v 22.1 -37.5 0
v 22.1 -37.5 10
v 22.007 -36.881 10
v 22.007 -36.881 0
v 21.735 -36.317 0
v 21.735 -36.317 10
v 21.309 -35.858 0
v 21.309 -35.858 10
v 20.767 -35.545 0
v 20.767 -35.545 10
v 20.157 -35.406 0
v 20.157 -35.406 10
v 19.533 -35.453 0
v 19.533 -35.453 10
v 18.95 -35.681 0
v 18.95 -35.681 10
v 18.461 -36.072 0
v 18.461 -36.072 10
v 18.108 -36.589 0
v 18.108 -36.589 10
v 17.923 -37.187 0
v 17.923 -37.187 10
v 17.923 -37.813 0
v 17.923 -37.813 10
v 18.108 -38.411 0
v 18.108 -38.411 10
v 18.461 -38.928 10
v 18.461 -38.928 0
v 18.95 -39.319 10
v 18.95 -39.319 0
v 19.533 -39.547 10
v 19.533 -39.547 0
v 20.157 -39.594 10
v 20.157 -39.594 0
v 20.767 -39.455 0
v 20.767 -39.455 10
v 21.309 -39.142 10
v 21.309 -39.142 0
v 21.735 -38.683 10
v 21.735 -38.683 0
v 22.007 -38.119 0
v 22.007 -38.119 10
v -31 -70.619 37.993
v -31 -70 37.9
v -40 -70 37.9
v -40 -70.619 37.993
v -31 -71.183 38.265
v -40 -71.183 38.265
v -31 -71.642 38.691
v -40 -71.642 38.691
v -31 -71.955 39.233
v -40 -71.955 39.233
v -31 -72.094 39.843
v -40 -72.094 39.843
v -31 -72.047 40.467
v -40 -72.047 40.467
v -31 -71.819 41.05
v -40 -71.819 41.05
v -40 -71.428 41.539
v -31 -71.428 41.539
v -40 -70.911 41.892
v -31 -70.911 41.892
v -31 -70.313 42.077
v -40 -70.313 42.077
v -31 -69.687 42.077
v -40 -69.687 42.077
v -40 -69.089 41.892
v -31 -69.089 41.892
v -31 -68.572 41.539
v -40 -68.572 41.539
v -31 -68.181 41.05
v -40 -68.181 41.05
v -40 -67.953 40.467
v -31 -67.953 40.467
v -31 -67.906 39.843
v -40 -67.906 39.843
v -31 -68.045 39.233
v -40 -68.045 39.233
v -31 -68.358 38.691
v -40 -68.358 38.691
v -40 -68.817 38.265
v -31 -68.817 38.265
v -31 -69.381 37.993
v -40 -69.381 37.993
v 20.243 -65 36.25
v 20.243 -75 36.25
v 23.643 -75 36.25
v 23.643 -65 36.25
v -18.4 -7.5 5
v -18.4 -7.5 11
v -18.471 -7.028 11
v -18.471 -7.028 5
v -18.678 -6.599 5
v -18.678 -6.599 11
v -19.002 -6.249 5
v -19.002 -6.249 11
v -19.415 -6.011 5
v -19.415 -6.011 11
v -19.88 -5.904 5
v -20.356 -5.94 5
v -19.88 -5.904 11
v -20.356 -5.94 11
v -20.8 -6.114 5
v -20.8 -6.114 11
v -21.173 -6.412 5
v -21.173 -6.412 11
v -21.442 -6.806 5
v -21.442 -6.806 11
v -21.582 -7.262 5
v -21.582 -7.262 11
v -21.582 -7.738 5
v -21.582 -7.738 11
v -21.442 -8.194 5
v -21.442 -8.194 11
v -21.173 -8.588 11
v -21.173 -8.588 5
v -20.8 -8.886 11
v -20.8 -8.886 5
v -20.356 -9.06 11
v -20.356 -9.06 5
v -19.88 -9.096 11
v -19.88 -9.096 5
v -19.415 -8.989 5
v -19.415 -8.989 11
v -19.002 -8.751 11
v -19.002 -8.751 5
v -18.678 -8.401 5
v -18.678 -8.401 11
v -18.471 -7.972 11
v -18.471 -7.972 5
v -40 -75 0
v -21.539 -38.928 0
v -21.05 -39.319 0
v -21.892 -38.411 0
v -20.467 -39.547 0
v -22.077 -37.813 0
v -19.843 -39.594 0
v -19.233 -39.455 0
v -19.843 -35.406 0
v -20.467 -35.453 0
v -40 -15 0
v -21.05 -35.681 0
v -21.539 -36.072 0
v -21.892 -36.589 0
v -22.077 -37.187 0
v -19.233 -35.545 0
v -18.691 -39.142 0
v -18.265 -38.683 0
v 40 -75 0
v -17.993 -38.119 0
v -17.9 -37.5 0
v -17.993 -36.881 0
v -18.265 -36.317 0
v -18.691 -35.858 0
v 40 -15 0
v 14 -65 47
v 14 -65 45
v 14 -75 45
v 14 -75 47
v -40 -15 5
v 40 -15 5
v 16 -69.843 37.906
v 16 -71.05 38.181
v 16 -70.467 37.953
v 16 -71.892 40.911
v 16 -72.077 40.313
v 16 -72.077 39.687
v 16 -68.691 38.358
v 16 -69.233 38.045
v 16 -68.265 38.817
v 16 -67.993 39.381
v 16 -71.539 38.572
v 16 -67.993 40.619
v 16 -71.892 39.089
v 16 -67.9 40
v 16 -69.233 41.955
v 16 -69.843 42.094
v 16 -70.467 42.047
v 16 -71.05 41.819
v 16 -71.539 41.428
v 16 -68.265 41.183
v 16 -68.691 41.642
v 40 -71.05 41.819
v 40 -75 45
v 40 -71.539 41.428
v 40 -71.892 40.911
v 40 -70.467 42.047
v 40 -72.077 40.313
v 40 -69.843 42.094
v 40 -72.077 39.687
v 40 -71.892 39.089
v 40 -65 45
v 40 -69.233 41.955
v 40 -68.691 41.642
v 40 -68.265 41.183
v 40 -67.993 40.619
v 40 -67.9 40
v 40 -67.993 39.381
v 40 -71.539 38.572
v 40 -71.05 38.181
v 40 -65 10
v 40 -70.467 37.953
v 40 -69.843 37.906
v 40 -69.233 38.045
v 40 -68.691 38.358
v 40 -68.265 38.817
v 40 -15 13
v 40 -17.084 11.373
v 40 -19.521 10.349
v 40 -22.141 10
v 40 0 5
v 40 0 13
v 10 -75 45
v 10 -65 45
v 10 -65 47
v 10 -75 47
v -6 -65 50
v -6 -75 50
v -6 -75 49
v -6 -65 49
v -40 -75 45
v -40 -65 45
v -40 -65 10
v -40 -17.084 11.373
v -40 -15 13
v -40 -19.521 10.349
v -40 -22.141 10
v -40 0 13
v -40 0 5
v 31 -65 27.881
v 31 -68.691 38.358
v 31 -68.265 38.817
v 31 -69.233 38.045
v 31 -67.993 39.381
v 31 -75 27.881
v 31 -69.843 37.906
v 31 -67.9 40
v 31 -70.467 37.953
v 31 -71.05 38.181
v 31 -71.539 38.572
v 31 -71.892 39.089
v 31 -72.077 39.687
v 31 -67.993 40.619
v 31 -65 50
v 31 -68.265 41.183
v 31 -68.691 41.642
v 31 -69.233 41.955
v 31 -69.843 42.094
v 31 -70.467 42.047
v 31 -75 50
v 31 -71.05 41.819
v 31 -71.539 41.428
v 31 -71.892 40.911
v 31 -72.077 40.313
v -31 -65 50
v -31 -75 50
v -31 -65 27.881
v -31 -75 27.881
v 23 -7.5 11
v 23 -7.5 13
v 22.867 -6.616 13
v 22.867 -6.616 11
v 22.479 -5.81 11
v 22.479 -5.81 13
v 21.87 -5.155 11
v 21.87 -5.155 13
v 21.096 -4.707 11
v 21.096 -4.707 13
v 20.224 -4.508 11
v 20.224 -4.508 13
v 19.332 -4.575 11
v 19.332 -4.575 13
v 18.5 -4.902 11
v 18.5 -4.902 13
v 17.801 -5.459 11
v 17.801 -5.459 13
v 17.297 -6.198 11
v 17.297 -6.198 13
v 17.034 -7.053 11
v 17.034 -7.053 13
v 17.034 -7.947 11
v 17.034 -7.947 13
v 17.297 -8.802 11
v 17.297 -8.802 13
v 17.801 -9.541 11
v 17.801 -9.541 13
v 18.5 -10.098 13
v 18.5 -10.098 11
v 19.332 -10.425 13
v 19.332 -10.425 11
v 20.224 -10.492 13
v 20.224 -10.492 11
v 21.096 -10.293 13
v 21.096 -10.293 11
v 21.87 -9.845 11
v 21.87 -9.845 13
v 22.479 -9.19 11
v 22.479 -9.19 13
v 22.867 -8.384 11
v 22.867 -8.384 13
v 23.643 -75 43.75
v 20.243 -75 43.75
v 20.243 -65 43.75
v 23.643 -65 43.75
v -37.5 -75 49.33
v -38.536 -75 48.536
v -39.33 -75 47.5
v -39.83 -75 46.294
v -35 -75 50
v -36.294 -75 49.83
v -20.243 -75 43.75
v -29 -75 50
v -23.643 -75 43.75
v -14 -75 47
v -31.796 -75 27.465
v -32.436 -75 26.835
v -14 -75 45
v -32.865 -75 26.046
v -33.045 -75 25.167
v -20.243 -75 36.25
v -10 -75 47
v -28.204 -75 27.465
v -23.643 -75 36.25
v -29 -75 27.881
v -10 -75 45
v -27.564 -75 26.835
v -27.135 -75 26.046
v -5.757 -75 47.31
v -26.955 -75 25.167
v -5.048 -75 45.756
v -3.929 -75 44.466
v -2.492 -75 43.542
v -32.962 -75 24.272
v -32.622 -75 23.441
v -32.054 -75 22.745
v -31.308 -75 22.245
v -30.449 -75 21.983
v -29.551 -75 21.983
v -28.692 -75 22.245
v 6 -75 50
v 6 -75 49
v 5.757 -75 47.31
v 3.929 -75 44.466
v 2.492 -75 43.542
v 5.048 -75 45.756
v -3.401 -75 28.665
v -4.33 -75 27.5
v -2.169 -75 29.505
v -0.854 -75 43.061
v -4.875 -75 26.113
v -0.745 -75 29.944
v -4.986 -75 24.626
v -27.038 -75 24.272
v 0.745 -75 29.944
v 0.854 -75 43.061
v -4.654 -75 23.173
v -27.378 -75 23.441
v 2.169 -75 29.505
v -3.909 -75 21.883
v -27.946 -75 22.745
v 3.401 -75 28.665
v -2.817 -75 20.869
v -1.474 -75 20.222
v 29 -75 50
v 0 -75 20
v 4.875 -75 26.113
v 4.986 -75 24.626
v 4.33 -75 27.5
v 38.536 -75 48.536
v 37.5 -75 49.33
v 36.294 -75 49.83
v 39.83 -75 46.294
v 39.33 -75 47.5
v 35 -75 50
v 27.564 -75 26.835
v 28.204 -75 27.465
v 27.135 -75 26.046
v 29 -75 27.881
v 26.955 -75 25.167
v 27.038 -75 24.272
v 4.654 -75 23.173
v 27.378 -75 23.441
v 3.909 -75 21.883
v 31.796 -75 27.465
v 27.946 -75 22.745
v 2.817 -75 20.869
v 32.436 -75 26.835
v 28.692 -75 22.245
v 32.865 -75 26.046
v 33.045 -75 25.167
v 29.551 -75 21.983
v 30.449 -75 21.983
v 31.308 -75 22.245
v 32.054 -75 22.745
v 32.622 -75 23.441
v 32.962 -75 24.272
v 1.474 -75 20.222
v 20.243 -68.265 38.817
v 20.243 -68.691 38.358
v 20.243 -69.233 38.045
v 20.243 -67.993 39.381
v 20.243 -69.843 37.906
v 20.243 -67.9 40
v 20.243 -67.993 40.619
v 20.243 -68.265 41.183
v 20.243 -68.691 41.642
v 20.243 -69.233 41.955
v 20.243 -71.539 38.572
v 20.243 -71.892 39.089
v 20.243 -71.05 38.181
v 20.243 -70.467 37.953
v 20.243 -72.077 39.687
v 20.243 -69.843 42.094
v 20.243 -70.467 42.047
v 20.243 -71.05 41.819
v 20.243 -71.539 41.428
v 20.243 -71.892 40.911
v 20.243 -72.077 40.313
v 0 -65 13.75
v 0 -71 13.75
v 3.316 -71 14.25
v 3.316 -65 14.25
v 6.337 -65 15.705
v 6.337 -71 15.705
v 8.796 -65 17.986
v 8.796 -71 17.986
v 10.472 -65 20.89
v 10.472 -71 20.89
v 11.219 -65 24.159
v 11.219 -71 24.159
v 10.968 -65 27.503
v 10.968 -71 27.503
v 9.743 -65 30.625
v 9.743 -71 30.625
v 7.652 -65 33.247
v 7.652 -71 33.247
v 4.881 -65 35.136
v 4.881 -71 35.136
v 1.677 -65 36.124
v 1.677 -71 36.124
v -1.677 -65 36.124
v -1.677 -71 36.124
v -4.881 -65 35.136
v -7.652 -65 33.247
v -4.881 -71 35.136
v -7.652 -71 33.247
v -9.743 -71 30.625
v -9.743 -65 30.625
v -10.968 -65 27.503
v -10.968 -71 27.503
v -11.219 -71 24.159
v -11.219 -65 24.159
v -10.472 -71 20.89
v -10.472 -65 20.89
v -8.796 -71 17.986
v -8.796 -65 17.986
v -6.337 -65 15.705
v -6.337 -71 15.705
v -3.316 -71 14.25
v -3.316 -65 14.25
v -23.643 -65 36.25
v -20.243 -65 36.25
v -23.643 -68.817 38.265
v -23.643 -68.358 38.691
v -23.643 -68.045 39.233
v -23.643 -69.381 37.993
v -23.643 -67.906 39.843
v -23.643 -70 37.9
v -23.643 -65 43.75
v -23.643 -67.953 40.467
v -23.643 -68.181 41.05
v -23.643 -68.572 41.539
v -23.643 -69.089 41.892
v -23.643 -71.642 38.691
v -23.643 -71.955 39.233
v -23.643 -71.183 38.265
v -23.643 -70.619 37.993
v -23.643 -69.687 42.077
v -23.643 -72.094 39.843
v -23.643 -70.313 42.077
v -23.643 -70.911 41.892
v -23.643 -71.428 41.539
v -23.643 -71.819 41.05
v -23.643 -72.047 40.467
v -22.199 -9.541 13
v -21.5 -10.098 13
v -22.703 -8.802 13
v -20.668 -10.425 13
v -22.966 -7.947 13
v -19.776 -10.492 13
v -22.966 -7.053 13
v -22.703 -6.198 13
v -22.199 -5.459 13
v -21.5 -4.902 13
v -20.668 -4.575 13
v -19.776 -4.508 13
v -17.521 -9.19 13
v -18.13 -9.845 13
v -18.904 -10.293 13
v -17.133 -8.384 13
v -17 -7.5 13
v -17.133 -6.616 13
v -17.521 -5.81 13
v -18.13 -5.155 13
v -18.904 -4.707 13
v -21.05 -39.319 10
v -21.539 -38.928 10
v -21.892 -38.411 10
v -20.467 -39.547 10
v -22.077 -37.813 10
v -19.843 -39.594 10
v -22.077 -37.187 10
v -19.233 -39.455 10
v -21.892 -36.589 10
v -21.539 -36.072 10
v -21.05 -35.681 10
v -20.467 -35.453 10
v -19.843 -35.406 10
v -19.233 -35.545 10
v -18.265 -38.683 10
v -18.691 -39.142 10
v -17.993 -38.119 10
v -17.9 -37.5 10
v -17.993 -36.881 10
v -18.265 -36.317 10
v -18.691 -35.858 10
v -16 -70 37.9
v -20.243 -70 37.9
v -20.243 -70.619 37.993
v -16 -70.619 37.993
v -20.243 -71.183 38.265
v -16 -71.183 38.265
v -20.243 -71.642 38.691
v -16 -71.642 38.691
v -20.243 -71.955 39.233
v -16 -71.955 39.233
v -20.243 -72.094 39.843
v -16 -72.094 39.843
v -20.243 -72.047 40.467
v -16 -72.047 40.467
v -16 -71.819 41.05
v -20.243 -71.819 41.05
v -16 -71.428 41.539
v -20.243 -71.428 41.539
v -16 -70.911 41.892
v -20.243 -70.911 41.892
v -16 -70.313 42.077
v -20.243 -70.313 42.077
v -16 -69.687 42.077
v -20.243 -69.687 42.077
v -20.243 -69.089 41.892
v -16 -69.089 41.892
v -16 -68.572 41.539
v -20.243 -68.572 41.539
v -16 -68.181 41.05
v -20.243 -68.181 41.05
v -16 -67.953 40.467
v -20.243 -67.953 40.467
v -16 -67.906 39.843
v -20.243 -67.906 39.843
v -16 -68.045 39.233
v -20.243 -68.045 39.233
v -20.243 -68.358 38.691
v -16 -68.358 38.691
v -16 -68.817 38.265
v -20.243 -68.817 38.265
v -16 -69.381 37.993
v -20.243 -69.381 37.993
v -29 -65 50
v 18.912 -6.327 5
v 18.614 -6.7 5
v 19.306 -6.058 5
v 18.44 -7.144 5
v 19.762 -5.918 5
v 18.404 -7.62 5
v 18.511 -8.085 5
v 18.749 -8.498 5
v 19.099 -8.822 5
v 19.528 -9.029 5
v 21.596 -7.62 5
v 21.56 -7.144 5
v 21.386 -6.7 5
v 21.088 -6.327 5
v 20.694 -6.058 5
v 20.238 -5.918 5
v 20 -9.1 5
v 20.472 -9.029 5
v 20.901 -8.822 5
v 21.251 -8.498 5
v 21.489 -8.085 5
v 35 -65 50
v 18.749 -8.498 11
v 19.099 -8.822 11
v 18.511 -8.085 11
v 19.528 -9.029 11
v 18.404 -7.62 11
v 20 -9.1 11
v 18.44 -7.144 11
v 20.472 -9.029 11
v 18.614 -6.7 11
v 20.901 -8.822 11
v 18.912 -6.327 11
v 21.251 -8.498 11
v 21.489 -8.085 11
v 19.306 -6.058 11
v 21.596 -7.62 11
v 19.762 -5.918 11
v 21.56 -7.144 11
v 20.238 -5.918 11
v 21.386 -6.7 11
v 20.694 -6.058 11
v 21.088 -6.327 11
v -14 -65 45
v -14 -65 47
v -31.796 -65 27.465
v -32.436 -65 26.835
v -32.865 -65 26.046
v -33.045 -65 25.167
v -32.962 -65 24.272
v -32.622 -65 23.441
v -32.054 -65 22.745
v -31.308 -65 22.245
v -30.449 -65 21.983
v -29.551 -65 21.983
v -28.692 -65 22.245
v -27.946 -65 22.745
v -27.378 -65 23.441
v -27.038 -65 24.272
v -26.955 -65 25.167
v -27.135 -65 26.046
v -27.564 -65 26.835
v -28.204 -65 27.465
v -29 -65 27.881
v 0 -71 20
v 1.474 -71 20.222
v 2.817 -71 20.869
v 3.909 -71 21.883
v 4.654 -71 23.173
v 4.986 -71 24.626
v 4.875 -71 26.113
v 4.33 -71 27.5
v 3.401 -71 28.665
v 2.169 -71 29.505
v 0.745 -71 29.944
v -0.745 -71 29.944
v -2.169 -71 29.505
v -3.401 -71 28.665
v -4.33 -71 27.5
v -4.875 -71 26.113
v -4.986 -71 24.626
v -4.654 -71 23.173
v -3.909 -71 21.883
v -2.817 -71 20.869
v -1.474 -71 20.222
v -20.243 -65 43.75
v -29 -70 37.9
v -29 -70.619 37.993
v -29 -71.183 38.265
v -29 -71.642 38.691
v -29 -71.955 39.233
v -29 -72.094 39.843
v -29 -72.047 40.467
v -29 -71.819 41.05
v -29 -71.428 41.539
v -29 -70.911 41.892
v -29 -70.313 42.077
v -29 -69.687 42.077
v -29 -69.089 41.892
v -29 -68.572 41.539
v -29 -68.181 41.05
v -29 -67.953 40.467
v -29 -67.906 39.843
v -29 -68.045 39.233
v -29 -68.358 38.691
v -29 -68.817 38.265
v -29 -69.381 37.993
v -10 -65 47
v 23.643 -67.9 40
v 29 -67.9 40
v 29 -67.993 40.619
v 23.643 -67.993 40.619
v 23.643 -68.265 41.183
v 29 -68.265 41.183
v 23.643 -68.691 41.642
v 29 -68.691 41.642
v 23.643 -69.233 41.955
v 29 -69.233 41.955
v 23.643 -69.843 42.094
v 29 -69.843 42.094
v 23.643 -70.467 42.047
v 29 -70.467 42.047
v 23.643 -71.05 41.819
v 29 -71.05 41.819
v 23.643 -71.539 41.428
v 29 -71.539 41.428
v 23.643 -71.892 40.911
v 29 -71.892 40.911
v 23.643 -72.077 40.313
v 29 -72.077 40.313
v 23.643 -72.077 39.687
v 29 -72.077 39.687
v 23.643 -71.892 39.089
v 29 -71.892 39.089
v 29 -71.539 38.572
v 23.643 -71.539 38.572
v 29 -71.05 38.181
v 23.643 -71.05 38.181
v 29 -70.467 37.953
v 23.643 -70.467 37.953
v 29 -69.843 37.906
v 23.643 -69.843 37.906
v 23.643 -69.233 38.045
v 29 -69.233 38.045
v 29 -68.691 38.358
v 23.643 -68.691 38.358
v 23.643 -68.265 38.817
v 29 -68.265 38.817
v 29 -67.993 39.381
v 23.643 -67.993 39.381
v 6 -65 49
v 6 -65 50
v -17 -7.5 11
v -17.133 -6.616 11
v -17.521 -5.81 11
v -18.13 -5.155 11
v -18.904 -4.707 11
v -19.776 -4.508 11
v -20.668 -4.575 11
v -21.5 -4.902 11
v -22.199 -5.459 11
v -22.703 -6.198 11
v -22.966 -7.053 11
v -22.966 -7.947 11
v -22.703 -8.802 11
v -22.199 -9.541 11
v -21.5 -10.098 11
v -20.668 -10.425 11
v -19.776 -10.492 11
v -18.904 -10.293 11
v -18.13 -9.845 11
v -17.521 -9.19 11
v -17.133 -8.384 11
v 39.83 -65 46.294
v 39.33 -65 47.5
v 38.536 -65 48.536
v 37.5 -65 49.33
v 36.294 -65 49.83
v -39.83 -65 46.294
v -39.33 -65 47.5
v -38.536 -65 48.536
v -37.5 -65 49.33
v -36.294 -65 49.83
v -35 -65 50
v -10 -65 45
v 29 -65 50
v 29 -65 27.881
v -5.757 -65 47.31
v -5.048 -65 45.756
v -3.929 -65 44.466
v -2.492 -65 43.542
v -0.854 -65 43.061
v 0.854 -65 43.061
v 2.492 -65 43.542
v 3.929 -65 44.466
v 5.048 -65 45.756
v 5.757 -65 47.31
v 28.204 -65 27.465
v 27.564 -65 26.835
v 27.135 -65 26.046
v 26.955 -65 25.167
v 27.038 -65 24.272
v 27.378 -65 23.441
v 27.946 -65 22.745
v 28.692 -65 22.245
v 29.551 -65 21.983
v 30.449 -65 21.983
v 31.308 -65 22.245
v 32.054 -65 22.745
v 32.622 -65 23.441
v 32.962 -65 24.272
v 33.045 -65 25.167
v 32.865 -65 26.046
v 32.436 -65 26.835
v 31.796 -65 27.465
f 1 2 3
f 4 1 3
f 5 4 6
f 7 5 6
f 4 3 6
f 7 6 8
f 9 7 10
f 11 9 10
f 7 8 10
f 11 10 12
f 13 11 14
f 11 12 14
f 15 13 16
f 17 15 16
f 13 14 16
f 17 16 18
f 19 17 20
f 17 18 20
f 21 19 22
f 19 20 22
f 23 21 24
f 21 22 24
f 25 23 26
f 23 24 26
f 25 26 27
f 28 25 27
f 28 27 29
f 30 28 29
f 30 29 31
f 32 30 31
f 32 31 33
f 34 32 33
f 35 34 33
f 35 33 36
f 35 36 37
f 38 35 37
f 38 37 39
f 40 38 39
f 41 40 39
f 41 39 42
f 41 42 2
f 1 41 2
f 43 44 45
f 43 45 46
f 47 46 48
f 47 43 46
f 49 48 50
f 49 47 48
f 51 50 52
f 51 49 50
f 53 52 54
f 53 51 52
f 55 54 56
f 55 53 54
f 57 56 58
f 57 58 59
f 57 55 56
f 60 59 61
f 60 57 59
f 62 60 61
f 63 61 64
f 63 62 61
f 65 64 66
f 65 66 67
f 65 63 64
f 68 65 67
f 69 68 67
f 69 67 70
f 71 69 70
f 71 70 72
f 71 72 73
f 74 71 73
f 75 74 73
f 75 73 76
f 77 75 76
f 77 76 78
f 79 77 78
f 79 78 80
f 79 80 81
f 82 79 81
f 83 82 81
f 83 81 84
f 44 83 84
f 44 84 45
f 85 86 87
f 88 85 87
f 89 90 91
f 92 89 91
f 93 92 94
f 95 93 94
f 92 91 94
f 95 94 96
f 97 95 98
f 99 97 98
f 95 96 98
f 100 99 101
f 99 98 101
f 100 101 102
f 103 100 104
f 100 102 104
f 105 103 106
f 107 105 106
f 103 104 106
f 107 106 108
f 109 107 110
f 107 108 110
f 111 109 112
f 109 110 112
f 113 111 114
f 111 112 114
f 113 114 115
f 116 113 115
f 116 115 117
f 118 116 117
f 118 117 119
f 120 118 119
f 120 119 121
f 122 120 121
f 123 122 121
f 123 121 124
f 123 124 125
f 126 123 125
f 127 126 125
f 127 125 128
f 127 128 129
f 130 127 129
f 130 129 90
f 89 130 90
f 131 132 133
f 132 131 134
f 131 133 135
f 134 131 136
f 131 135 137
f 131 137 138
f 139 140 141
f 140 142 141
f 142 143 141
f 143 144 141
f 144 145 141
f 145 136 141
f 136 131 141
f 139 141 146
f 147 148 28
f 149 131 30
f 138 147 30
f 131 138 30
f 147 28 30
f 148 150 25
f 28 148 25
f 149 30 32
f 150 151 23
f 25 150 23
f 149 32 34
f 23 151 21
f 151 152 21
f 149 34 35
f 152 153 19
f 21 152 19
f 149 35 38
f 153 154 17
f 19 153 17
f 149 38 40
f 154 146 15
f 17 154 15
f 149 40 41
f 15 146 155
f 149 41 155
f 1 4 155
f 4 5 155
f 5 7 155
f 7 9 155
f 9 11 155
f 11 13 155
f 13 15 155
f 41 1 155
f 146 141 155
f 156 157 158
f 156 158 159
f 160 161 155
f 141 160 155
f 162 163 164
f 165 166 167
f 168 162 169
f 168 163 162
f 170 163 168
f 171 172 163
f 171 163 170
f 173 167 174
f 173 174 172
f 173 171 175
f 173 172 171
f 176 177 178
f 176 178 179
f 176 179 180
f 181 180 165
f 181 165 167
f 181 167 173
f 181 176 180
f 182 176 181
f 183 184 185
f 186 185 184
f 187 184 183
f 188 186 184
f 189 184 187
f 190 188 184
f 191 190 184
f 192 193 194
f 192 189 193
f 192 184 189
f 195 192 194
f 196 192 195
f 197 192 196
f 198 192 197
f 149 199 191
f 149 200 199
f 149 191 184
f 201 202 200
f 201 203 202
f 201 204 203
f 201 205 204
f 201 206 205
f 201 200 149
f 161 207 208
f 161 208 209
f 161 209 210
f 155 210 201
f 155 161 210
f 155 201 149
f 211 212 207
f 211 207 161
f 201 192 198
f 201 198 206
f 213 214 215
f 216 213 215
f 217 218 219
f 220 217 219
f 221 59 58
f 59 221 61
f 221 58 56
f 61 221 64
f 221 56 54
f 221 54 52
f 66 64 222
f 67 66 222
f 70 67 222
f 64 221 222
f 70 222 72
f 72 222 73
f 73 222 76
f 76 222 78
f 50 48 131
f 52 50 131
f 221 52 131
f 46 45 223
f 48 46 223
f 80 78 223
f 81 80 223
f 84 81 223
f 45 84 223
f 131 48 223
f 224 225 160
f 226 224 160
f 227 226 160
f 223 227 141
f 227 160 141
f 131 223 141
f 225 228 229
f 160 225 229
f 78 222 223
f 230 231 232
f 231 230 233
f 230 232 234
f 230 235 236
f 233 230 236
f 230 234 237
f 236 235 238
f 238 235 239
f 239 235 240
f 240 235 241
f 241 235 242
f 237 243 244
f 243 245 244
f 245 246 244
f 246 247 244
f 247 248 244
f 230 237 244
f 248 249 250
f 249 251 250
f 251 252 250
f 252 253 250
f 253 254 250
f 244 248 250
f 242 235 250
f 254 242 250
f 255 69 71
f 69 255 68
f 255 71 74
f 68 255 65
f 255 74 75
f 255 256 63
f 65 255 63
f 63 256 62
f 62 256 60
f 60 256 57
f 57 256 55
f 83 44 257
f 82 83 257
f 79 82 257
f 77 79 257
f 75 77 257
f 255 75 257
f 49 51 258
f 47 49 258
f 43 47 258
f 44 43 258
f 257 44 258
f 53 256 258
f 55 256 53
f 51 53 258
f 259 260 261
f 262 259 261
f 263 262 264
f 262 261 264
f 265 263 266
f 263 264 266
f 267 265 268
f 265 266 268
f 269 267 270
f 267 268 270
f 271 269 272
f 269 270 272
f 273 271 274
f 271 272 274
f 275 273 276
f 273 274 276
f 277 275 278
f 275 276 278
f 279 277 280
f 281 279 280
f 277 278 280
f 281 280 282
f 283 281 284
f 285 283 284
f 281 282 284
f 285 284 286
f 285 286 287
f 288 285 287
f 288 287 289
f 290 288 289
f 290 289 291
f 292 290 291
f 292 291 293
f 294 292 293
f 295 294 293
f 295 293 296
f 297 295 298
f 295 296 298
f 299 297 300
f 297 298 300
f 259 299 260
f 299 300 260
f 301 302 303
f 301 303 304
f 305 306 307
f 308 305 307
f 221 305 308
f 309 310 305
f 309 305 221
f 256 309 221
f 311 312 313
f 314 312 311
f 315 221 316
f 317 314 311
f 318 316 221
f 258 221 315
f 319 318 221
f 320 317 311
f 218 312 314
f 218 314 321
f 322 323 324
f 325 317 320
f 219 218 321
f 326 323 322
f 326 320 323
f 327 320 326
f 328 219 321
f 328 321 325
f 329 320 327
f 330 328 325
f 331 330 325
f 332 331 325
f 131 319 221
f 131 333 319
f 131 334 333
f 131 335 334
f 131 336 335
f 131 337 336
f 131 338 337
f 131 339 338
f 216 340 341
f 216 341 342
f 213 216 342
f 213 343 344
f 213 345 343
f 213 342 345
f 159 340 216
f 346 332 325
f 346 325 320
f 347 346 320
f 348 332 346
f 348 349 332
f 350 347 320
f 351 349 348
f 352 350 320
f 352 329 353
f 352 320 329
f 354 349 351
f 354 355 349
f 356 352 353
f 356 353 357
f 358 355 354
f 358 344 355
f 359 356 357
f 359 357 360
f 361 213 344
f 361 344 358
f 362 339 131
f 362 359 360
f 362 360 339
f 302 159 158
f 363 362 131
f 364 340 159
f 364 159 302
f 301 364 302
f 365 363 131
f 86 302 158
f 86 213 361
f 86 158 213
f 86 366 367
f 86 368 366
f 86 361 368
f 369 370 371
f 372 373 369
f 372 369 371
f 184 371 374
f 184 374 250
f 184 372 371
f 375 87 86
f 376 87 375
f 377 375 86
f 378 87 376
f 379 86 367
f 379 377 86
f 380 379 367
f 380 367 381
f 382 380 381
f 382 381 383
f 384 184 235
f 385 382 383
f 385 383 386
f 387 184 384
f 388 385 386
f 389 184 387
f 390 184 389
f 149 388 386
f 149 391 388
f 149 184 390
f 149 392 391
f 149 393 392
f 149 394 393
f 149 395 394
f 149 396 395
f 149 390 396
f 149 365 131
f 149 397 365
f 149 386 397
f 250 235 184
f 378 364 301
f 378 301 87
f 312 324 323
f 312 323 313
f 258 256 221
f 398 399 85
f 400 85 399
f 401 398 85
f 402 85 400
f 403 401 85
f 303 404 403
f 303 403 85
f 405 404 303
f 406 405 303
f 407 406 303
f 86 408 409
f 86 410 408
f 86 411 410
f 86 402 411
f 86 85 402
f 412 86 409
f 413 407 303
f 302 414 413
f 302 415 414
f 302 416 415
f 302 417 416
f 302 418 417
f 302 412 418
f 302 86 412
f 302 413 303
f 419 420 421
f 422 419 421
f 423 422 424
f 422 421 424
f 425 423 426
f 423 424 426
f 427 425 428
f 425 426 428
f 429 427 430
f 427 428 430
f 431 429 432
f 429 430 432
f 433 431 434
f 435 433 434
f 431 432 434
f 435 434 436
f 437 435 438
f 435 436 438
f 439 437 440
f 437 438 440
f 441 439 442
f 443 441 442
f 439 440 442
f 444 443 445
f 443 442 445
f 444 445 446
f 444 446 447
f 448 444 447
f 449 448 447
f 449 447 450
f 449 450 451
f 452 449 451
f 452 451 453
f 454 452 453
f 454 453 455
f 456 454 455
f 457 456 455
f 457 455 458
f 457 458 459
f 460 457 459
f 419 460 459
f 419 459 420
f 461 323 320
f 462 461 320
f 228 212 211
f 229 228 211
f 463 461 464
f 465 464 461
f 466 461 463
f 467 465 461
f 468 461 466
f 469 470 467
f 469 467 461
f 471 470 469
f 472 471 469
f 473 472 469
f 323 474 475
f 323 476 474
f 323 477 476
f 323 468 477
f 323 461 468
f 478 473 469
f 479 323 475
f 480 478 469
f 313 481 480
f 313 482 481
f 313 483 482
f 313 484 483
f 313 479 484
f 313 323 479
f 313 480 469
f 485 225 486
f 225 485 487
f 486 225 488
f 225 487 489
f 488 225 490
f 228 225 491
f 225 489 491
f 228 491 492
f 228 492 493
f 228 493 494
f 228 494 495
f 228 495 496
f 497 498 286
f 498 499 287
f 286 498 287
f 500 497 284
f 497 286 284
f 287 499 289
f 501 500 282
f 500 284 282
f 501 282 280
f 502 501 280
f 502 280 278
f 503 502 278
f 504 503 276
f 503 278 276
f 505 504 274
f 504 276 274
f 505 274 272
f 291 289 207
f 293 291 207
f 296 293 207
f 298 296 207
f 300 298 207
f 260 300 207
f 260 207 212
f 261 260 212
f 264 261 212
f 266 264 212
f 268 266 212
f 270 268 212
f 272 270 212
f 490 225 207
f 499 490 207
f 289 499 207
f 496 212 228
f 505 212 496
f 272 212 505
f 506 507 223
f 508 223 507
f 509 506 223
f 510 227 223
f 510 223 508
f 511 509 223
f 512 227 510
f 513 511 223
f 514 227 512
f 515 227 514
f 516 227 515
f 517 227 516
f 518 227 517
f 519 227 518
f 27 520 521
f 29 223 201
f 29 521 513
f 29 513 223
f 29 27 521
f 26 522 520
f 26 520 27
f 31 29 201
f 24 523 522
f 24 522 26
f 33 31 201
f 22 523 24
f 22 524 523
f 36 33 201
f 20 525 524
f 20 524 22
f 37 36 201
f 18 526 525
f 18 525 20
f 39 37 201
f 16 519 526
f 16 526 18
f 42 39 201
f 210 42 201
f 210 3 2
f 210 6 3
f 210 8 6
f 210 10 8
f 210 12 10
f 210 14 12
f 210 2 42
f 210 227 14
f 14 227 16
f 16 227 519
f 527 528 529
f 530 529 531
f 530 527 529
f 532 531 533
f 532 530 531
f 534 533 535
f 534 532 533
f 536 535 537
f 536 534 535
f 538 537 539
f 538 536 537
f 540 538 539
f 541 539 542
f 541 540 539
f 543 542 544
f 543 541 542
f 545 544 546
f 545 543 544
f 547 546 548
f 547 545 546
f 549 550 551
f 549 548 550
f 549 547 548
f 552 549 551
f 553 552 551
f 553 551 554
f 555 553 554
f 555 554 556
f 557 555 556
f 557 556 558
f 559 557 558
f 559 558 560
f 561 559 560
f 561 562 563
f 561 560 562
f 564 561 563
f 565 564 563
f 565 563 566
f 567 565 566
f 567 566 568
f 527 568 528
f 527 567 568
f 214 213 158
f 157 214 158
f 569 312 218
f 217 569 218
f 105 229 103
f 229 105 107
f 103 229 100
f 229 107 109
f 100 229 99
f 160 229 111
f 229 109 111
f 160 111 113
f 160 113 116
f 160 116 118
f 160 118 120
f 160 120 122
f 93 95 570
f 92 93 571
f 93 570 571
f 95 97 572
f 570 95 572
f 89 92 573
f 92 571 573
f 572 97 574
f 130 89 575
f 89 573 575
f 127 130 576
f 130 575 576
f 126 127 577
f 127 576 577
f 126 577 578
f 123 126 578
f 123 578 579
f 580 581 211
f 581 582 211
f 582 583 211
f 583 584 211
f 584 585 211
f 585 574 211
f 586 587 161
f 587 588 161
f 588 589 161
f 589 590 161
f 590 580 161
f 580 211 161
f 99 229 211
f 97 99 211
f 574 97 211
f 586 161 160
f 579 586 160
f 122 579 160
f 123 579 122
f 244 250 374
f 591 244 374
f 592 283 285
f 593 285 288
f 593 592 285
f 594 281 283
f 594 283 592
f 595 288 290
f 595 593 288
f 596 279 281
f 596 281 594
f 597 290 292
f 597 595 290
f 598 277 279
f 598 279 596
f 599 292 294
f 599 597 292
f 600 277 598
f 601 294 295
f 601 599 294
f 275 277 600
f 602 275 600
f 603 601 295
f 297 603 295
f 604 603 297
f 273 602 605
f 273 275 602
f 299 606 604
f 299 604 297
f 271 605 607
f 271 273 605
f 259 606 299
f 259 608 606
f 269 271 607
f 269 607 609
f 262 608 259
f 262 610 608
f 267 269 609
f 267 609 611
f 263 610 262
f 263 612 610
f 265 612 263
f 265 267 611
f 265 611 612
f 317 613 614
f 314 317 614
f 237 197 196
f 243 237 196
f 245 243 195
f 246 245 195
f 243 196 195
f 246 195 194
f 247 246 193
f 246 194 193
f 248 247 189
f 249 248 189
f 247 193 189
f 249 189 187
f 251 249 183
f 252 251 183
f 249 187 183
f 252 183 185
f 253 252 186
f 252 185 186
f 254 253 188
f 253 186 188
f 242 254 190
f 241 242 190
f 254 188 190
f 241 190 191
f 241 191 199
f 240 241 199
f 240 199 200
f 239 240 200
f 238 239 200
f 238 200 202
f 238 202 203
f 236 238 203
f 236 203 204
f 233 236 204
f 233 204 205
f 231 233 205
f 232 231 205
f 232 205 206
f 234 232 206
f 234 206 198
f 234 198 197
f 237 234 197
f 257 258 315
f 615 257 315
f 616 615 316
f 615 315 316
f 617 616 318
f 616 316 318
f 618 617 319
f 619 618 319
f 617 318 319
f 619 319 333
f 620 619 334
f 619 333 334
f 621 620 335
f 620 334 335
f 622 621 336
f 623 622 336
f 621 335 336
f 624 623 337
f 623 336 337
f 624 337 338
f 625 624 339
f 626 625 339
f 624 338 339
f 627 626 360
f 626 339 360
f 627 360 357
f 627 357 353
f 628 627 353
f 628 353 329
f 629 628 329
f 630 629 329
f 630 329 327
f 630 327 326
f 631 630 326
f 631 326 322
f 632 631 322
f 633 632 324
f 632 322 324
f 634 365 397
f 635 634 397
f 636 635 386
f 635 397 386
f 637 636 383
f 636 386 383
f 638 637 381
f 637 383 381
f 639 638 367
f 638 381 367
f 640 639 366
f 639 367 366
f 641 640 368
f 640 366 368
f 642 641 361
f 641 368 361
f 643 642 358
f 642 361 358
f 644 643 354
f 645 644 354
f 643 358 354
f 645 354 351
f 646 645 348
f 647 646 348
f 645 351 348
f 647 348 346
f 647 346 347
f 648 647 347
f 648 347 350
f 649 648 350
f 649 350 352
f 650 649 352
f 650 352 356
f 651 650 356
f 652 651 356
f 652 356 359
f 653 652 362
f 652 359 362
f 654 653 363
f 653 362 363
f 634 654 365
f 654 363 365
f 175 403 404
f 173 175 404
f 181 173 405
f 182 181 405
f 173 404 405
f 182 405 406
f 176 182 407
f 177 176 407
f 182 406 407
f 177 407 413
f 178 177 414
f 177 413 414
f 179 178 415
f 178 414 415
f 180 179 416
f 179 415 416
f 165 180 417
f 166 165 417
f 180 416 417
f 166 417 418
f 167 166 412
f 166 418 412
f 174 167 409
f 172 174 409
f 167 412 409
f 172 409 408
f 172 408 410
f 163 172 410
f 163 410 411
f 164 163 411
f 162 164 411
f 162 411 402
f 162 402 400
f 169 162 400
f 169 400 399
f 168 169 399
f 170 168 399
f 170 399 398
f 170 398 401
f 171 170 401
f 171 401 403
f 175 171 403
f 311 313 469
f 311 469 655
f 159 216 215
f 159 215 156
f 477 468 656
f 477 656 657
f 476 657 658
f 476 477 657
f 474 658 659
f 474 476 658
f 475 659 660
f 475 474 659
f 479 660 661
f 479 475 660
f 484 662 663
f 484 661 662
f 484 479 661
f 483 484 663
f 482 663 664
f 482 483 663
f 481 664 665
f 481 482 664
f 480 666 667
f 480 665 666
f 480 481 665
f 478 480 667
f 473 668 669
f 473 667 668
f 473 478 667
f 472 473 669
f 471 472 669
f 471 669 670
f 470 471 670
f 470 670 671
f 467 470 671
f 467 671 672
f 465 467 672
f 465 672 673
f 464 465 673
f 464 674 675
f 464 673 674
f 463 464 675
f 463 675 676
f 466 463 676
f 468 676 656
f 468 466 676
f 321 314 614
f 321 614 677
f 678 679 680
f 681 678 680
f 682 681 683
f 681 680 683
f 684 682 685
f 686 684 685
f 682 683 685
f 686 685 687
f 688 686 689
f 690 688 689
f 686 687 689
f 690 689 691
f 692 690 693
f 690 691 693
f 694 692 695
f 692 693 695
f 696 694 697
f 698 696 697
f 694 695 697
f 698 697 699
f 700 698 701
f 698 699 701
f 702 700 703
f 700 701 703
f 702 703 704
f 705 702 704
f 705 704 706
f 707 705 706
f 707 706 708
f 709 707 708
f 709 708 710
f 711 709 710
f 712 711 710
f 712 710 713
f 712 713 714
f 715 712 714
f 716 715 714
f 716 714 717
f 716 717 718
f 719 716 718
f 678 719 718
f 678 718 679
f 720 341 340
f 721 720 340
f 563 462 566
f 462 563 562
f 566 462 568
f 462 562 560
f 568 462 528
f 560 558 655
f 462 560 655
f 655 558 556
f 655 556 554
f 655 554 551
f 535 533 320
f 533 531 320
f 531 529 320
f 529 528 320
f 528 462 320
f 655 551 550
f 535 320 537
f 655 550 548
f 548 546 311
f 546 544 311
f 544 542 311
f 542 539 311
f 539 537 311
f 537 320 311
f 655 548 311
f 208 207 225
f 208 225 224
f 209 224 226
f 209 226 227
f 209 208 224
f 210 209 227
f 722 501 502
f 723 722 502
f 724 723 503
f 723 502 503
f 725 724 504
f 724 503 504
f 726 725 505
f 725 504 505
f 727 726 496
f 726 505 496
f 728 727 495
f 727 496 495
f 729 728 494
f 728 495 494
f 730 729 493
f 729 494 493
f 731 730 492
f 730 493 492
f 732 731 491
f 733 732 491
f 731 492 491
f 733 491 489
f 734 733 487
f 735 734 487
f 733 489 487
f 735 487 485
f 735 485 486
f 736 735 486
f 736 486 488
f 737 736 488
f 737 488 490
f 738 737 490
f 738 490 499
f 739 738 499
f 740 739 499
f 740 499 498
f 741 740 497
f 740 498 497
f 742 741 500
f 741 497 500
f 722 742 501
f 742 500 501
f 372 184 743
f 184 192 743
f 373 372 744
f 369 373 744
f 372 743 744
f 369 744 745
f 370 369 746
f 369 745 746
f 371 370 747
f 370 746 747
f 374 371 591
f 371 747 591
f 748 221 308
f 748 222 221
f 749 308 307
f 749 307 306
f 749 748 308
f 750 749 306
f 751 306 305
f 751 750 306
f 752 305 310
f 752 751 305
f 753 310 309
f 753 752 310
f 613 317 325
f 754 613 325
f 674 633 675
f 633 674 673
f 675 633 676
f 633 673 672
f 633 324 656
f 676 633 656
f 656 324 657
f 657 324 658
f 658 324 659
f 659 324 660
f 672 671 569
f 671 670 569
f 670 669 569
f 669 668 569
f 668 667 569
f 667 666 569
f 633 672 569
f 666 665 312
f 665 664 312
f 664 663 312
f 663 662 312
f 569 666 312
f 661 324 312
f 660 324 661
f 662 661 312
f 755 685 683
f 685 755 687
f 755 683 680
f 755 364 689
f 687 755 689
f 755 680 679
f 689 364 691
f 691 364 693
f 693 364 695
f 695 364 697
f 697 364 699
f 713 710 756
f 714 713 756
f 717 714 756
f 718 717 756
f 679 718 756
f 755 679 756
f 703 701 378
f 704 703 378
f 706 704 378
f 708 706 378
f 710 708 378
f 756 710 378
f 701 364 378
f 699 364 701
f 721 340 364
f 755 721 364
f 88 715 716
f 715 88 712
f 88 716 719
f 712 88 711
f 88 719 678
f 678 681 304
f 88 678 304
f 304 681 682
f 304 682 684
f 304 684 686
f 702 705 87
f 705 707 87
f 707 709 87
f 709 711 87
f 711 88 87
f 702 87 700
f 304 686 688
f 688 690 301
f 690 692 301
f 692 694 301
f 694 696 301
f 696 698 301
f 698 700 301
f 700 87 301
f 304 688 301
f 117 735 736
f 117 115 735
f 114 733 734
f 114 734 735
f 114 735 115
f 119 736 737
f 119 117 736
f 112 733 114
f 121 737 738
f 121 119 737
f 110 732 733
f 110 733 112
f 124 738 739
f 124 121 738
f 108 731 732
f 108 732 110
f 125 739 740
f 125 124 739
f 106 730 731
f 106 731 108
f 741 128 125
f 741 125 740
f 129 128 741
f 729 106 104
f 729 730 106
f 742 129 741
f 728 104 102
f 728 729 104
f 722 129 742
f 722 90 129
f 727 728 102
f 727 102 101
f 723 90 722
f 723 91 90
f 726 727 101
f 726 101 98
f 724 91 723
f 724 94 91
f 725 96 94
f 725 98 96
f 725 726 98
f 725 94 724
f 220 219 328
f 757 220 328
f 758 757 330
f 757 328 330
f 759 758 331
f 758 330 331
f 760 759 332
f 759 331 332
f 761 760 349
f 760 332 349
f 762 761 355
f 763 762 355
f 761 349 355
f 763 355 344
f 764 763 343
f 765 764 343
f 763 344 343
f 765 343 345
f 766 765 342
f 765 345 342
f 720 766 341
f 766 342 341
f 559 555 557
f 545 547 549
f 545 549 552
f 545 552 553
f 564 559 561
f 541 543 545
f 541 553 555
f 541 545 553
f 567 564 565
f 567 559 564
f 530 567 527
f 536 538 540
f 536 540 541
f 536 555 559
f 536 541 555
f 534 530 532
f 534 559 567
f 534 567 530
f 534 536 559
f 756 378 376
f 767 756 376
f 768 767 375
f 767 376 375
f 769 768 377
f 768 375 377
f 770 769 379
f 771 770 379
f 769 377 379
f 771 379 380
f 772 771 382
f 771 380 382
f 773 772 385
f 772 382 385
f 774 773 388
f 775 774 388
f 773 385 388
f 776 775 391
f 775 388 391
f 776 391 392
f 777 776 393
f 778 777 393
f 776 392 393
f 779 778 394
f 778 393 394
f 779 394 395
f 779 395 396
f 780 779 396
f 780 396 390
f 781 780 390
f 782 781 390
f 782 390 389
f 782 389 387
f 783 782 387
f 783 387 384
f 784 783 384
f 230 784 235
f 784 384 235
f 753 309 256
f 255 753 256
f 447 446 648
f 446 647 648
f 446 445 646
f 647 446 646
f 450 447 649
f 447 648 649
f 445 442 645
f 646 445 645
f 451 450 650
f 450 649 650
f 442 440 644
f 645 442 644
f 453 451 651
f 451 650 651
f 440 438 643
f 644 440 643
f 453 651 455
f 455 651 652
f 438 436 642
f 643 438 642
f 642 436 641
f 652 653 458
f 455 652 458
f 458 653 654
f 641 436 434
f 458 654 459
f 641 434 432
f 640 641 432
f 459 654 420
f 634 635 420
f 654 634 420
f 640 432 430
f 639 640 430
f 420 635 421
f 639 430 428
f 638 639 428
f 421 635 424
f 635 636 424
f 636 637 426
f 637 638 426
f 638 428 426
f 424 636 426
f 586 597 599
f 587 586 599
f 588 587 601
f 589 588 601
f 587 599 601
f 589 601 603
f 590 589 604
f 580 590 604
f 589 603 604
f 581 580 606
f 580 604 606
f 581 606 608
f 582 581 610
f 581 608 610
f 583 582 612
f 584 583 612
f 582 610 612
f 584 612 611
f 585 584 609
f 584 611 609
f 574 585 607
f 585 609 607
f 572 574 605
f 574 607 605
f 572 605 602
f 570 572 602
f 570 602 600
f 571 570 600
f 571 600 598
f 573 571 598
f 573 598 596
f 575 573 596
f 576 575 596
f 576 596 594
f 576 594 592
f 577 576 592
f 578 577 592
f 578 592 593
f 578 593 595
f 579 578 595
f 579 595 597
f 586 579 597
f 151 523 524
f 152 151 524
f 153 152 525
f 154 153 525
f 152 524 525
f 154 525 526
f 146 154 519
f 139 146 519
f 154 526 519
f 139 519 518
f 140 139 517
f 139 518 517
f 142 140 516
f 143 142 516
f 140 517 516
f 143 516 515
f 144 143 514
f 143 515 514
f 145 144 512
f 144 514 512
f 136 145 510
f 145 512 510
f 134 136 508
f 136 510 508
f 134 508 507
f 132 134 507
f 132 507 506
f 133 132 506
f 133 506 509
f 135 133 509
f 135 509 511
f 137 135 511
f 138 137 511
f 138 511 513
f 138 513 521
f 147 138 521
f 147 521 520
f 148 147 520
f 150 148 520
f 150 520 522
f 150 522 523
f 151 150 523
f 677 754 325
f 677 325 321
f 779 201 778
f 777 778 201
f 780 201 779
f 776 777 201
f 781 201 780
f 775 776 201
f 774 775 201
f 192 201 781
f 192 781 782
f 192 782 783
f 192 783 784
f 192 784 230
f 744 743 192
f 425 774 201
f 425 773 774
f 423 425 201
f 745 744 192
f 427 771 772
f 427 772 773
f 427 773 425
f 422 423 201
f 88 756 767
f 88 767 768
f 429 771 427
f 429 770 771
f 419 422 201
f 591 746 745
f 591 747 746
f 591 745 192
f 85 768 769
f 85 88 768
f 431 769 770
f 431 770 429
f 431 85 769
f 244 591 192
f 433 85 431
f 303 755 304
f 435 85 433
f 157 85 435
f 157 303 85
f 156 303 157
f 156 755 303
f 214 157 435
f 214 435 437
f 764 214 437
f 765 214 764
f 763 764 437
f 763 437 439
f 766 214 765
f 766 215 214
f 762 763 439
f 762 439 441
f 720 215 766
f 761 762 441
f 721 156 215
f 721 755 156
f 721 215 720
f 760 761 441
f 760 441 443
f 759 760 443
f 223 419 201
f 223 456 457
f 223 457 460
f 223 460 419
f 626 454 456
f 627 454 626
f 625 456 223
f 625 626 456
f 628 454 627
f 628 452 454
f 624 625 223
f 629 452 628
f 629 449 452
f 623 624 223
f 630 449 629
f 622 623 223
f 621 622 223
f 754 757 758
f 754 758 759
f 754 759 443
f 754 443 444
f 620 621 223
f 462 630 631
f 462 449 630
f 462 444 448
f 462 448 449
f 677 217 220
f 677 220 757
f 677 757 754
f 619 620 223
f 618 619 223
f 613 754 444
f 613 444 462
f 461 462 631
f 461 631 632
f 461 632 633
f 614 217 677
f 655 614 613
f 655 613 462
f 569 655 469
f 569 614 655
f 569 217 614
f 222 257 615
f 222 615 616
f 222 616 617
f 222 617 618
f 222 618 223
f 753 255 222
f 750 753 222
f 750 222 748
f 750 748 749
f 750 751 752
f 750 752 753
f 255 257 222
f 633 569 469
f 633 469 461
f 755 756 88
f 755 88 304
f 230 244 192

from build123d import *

# Parameters (mm, degrees)
SKETCH_1_W           = 80
SKETCH_1_H           = 150
EXTRUDE_1_DEPTH      = 10
SKETCH_4_R           = 11.25
EXTRUDE_3_DEPTH      = 10
SKETCH_5_R           = 11.25
SKETCH_5_R_2         = 5
EXTRUDE_4_DEPTH      = 4
SKETCH_6_R           = 2.1
CUT_EXTRUDE_1_DEPTH  = 24
SKETCH_7_W           = 3.4
SKETCH_7_H           = 7.5
CUT_EXTRUDE_2_DEPTH  = 24
CUT_EXTRUDE_START    = -24
SKETCH_8_R           = 2.1
CUT_EXTRUDE_3_DEPTH  = 24
SKETCH_9_W           = 80
SKETCH_9_H           = 40
SKETCH_9_R           = 11
SKETCH_9_R_2         = 1.6
EXTRUDE_5_DEPTH      = 10
FILLET_1_R           = 5
CUT_EXTRUDE_START_2  = -10
SKETCH_10_W          = 3.4
SKETCH_10_H          = 7.5
CUT_EXTRUDE_5_DEPTH  = 10
SKETCH_11_R          = 2.1
CUT_EXTRUDE_6_DEPTH  = 24
SKETCH_12_R          = 2.1
CUT_EXTRUDE_7_DEPTH  = 24
SKETCH_14_W          = 4
SKETCH_14_H          = 2
CUT_EXTRUDE_9_DEPTH  = 10
SKETCH_16_R          = 2.1
CUT_EXTRUDE_10_DEPTH = 94.94147114
CUT_EXTRUDE_11_DEPTH = 121.519707932
SKETCH_18_W          = 3
SKETCH_18_H          = 15
EXTRUDE_7_DEPTH      = 80
FILLET_2_R           = 10
SKETCH_19_R          = 1.6
CUT_EXTRUDE_12_DEPTH = 80
SKETCH_20_R          = 3
CUT_EXTRUDE_13_DEPTH = 2


with BuildPart() as part:
    # 草圖1 → 填料-伸長1 (new body)
    with BuildSketch(Plane.XY):
        Rectangle(SKETCH_1_W, SKETCH_1_H)
    extrude(amount=EXTRUDE_1_DEPTH)

    # 草圖4 → 填料-伸長3 (add)
    with BuildSketch(Plane.XZ.offset(75)):
        with BuildLine():
            ThreePointArc((-6, 49), (0, 43), (6, 49))
            Line((6, 49), (6, 50))
            Line((6, 50), (29, 50))
            Line((29, 50), (29, 27.881405907))
            ThreePointArc((29, 27.881405907), (30, 21.95), (31, 27.881405907))
            Line((31, 27.881405907), (31, 50))
            Line((31, 50), (40, 50))
            Line((40, 50), (40, 10))
            Line((40, 10), (-40, 10))
            Line((-40, 10), (-40, 50))
            Line((-40, 50), (-31, 50))
            Line((-31, 50), (-31, 27.881405907))
            ThreePointArc((-31, 27.881405907), (-30, 21.95), (-29, 27.881405907))
            Line((-29, 27.881405907), (-29, 50))
            Line((-29, 50), (-6, 50))
            Line((-6, 50), (-6, 49))
        make_face()
        with Locations(Location((0, 25, 0), (0, 0, 270))):
            Circle(SKETCH_4_R, mode=Mode.SUBTRACT)
    extrude(amount=-EXTRUDE_3_DEPTH)

    # 草圖5 → 填料-伸長4 (add)
    with BuildSketch(Plane.XZ.offset(75)):
        with Locations(Location((0, 25, 0), (0, 0, 270))):
            Circle(SKETCH_5_R)
        with Locations(Location((0, 25, 0), (0, 0, 270))):
            Circle(SKETCH_5_R_2, mode=Mode.SUBTRACT)
    extrude(amount=-EXTRUDE_4_DEPTH)

    # 草圖6 → 除料-伸長1 (cut)
    with BuildSketch(Plane(origin=(40, 0, 0), x_dir=(0, 0, -1), z_dir=(1, 0, 0))):
        with Locations(Location((-40, -70, 0), (0, 0, 90))):
            Circle(SKETCH_6_R)
    extrude(amount=-CUT_EXTRUDE_1_DEPTH, mode=Mode.SUBTRACT)

    # 草圖7 → 除料-伸長2 (cut)
    with BuildSketch(Plane.XZ.offset(75)):
        with Locations((-21.943112787, 40)):
            Rectangle(SKETCH_7_W, SKETCH_7_H)
        with Locations((21.943112787, 40)):
            Rectangle(SKETCH_7_W, SKETCH_7_H)
    extrude(amount=-CUT_EXTRUDE_2_DEPTH, mode=Mode.SUBTRACT)

    # 草圖8 → 除料-伸長3 (cut)
    with BuildSketch(Plane.ZY.offset(40).offset(CUT_EXTRUDE_START)):
        with Locations(Location((40, -70, 0), (0, 0, 180))):
            Circle(SKETCH_8_R)
    extrude(amount=CUT_EXTRUDE_3_DEPTH, mode=Mode.SUBTRACT)

    # 草圖9 → 填料-伸長5 (add)
    with BuildSketch(Plane(origin=(0, 75, 0), x_dir=(1, 0, 0), z_dir=(0, 1, 0))):
        with Locations((0, -30)):
            Rectangle(SKETCH_9_W, SKETCH_9_H)
        with Locations(Location((0, -25, 0), (0, 0, 270))):
            Circle(SKETCH_9_R, mode=Mode.SUBTRACT)
        with Locations(Location((-21.920310217, -25, 0), (0, 0, 270))):
            Circle(SKETCH_9_R_2, mode=Mode.SUBTRACT)
        with Locations(Location((0, -46.920310217, 0), (0, 0, 270))):
            Circle(SKETCH_9_R_2, mode=Mode.SUBTRACT)
        with Locations(Location((21.920310217, -25, 0), (0, 0, 270))):
            Circle(SKETCH_9_R_2, mode=Mode.SUBTRACT)
    extrude(amount=-EXTRUDE_5_DEPTH)

    # 圓角1
    fillet_1_edges = [part.edges().sort_by_distance(p)[0] for p in [
        (40, 70, 50),
        (-40, 70, 50),
        (40, -70, 50),
        (-40, -70, 50),
    ]]
    fillet(fillet_1_edges, radius=FILLET_1_R)

    # 草圖10 → 除料-伸長5 (cut)
    with BuildSketch(Plane(origin=(0, 75, 0), x_dir=(1, 0, 0), z_dir=(0, 1, 0)).offset(CUT_EXTRUDE_START_2)):
        with BuildLine():
            Line((-30.992105359, -72.117230176), (-29, -72.117230176))
            Line((-29, -72.117230176), (-29, -27.881405907))
            ThreePointArc((-29, -27.881405907), (-30.004176302, -21.950002859), (-30.992105359, -27.884133658))
            Line((-30.992105359, -27.884133658), (-30.992105359, -72.117230176))
        make_face()
        with BuildLine():
            Line((29.001577897, -72.118320527), (31, -72.118320527))
            Line((31, -72.118320527), (31, -27.881405907))
            ThreePointArc((31, -27.881405907), (29.999164969, -21.950000114), (29.001577897, -27.881953036))
            Line((29.001577897, -27.881953036), (29.001577897, -72.118320527))
        make_face()
        with Locations((-21.943112787, -40)):
            Rectangle(SKETCH_10_W, SKETCH_10_H)
        with Locations((21.943112787, -40)):
            Rectangle(SKETCH_10_W, SKETCH_10_H)
    extrude(amount=CUT_EXTRUDE_5_DEPTH, mode=Mode.SUBTRACT)

    # 草圖11 → 除料-伸長6 (cut)
    with BuildSketch(Plane(origin=(40, 0, 0), x_dir=(0, 0, -1), z_dir=(1, 0, 0))):
        with Locations((-40, 70)):
            Circle(SKETCH_11_R)
    extrude(amount=-CUT_EXTRUDE_6_DEPTH, mode=Mode.SUBTRACT)

    # 草圖12 → 除料-伸長7 (cut)
    with BuildSketch(Plane.ZY.offset(40).offset(CUT_EXTRUDE_START)):
        with Locations(Location((40, 70, 0), (0, 0, 180))):
            Circle(SKETCH_12_R)
    extrude(amount=CUT_EXTRUDE_7_DEPTH, mode=Mode.SUBTRACT)

    # 草圖14 → 除料-伸長9 (cut)
    with BuildSketch(Plane.XZ.offset(75)):
        with Locations((-12, 46)):
            Rectangle(SKETCH_14_W, SKETCH_14_H)
        with Locations((12, 46)):
            Rectangle(SKETCH_14_W, SKETCH_14_H)
    extrude(amount=-CUT_EXTRUDE_9_DEPTH, mode=Mode.SUBTRACT)

    # 草圖16 → 除料-伸長10 (cut, through all)
    with BuildSketch(Plane.XY.offset(10)):
        with Locations((-20, 37.5)):
            Circle(SKETCH_16_R)
        with Locations((20, 37.5)):
            Circle(SKETCH_16_R)
        with Locations((20, -37.5)):
            Circle(SKETCH_16_R)
        with Locations((-20, -37.5)):
            Circle(SKETCH_16_R)
    extrude(amount=-CUT_EXTRUDE_10_DEPTH, mode=Mode.SUBTRACT)

    # 草圖17 → 除料-伸長11 (cut, through all)
    with BuildSketch(Plane(origin=(40, 0, 0), x_dir=(0, 0, -1), z_dir=(1, 0, 0))):
        Polygon((-5, 0), (-5, -15), (0, -15), (0, 75), (-50, 75), (-50, 65), (-10, 65), (-10, 0), align=None)
    extrude(amount=-CUT_EXTRUDE_11_DEPTH, mode=Mode.SUBTRACT)

    # 草圖18 → 填料-伸長7 (add)
    with BuildSketch(Plane(origin=(40, 0, 0), x_dir=(0, 0, -1), z_dir=(1, 0, 0))):
        with Locations((-11.5, -7.5)):
            Rectangle(SKETCH_18_W, SKETCH_18_H)
    extrude(amount=-EXTRUDE_7_DEPTH)

    # 圓角2
    # the kernel refuses this fillet: 10 mm, written as the material it adds along each edge
    with BuildSketch(Plane(origin=(40, -15, 10), x_dir=(0, 0, 1), z_dir=(-1, 0, 0))) as fillet_2_piece_1:
        with BuildLine():
            CenterArc((10, -7.141428429), FILLET_2_R, 134.427004001, 45.572995999)
            Line((0, -7.141428429), (-0.2, -7.141428429))
            Line((-0.2, -7.141428429), (-0.2, 0))
            Line((-0.2, 0), (0, 0.2))
            ThreePointArc((0, 0.2), (1.5, 0.2), (2.86, 0.142828569))
            Line((2.86, 0.142828569), (3, 0))
        make_face()
    extrude(amount=80)

    # 草圖19 → 除料-伸長12 (cut)
    with BuildSketch(Plane.XY.offset(13)):
        with Locations((-20, -7.5)):
            Circle(SKETCH_19_R)
        with Locations(Location((20, -7.5, 0), (0, 0, 270))):
            Circle(SKETCH_19_R)
    extrude(amount=-CUT_EXTRUDE_12_DEPTH, mode=Mode.SUBTRACT)

    # 草圖20 → 除料-伸長13 (cut)
    with BuildSketch(Plane.XY.offset(13)):
        with Locations((-20, -7.5)):
            Circle(SKETCH_20_R)
        with Locations((20, -7.5)):
            Circle(SKETCH_20_R)
    extrude(amount=-CUT_EXTRUDE_13_DEPTH, mode=Mode.SUBTRACT)


solid = part.part
